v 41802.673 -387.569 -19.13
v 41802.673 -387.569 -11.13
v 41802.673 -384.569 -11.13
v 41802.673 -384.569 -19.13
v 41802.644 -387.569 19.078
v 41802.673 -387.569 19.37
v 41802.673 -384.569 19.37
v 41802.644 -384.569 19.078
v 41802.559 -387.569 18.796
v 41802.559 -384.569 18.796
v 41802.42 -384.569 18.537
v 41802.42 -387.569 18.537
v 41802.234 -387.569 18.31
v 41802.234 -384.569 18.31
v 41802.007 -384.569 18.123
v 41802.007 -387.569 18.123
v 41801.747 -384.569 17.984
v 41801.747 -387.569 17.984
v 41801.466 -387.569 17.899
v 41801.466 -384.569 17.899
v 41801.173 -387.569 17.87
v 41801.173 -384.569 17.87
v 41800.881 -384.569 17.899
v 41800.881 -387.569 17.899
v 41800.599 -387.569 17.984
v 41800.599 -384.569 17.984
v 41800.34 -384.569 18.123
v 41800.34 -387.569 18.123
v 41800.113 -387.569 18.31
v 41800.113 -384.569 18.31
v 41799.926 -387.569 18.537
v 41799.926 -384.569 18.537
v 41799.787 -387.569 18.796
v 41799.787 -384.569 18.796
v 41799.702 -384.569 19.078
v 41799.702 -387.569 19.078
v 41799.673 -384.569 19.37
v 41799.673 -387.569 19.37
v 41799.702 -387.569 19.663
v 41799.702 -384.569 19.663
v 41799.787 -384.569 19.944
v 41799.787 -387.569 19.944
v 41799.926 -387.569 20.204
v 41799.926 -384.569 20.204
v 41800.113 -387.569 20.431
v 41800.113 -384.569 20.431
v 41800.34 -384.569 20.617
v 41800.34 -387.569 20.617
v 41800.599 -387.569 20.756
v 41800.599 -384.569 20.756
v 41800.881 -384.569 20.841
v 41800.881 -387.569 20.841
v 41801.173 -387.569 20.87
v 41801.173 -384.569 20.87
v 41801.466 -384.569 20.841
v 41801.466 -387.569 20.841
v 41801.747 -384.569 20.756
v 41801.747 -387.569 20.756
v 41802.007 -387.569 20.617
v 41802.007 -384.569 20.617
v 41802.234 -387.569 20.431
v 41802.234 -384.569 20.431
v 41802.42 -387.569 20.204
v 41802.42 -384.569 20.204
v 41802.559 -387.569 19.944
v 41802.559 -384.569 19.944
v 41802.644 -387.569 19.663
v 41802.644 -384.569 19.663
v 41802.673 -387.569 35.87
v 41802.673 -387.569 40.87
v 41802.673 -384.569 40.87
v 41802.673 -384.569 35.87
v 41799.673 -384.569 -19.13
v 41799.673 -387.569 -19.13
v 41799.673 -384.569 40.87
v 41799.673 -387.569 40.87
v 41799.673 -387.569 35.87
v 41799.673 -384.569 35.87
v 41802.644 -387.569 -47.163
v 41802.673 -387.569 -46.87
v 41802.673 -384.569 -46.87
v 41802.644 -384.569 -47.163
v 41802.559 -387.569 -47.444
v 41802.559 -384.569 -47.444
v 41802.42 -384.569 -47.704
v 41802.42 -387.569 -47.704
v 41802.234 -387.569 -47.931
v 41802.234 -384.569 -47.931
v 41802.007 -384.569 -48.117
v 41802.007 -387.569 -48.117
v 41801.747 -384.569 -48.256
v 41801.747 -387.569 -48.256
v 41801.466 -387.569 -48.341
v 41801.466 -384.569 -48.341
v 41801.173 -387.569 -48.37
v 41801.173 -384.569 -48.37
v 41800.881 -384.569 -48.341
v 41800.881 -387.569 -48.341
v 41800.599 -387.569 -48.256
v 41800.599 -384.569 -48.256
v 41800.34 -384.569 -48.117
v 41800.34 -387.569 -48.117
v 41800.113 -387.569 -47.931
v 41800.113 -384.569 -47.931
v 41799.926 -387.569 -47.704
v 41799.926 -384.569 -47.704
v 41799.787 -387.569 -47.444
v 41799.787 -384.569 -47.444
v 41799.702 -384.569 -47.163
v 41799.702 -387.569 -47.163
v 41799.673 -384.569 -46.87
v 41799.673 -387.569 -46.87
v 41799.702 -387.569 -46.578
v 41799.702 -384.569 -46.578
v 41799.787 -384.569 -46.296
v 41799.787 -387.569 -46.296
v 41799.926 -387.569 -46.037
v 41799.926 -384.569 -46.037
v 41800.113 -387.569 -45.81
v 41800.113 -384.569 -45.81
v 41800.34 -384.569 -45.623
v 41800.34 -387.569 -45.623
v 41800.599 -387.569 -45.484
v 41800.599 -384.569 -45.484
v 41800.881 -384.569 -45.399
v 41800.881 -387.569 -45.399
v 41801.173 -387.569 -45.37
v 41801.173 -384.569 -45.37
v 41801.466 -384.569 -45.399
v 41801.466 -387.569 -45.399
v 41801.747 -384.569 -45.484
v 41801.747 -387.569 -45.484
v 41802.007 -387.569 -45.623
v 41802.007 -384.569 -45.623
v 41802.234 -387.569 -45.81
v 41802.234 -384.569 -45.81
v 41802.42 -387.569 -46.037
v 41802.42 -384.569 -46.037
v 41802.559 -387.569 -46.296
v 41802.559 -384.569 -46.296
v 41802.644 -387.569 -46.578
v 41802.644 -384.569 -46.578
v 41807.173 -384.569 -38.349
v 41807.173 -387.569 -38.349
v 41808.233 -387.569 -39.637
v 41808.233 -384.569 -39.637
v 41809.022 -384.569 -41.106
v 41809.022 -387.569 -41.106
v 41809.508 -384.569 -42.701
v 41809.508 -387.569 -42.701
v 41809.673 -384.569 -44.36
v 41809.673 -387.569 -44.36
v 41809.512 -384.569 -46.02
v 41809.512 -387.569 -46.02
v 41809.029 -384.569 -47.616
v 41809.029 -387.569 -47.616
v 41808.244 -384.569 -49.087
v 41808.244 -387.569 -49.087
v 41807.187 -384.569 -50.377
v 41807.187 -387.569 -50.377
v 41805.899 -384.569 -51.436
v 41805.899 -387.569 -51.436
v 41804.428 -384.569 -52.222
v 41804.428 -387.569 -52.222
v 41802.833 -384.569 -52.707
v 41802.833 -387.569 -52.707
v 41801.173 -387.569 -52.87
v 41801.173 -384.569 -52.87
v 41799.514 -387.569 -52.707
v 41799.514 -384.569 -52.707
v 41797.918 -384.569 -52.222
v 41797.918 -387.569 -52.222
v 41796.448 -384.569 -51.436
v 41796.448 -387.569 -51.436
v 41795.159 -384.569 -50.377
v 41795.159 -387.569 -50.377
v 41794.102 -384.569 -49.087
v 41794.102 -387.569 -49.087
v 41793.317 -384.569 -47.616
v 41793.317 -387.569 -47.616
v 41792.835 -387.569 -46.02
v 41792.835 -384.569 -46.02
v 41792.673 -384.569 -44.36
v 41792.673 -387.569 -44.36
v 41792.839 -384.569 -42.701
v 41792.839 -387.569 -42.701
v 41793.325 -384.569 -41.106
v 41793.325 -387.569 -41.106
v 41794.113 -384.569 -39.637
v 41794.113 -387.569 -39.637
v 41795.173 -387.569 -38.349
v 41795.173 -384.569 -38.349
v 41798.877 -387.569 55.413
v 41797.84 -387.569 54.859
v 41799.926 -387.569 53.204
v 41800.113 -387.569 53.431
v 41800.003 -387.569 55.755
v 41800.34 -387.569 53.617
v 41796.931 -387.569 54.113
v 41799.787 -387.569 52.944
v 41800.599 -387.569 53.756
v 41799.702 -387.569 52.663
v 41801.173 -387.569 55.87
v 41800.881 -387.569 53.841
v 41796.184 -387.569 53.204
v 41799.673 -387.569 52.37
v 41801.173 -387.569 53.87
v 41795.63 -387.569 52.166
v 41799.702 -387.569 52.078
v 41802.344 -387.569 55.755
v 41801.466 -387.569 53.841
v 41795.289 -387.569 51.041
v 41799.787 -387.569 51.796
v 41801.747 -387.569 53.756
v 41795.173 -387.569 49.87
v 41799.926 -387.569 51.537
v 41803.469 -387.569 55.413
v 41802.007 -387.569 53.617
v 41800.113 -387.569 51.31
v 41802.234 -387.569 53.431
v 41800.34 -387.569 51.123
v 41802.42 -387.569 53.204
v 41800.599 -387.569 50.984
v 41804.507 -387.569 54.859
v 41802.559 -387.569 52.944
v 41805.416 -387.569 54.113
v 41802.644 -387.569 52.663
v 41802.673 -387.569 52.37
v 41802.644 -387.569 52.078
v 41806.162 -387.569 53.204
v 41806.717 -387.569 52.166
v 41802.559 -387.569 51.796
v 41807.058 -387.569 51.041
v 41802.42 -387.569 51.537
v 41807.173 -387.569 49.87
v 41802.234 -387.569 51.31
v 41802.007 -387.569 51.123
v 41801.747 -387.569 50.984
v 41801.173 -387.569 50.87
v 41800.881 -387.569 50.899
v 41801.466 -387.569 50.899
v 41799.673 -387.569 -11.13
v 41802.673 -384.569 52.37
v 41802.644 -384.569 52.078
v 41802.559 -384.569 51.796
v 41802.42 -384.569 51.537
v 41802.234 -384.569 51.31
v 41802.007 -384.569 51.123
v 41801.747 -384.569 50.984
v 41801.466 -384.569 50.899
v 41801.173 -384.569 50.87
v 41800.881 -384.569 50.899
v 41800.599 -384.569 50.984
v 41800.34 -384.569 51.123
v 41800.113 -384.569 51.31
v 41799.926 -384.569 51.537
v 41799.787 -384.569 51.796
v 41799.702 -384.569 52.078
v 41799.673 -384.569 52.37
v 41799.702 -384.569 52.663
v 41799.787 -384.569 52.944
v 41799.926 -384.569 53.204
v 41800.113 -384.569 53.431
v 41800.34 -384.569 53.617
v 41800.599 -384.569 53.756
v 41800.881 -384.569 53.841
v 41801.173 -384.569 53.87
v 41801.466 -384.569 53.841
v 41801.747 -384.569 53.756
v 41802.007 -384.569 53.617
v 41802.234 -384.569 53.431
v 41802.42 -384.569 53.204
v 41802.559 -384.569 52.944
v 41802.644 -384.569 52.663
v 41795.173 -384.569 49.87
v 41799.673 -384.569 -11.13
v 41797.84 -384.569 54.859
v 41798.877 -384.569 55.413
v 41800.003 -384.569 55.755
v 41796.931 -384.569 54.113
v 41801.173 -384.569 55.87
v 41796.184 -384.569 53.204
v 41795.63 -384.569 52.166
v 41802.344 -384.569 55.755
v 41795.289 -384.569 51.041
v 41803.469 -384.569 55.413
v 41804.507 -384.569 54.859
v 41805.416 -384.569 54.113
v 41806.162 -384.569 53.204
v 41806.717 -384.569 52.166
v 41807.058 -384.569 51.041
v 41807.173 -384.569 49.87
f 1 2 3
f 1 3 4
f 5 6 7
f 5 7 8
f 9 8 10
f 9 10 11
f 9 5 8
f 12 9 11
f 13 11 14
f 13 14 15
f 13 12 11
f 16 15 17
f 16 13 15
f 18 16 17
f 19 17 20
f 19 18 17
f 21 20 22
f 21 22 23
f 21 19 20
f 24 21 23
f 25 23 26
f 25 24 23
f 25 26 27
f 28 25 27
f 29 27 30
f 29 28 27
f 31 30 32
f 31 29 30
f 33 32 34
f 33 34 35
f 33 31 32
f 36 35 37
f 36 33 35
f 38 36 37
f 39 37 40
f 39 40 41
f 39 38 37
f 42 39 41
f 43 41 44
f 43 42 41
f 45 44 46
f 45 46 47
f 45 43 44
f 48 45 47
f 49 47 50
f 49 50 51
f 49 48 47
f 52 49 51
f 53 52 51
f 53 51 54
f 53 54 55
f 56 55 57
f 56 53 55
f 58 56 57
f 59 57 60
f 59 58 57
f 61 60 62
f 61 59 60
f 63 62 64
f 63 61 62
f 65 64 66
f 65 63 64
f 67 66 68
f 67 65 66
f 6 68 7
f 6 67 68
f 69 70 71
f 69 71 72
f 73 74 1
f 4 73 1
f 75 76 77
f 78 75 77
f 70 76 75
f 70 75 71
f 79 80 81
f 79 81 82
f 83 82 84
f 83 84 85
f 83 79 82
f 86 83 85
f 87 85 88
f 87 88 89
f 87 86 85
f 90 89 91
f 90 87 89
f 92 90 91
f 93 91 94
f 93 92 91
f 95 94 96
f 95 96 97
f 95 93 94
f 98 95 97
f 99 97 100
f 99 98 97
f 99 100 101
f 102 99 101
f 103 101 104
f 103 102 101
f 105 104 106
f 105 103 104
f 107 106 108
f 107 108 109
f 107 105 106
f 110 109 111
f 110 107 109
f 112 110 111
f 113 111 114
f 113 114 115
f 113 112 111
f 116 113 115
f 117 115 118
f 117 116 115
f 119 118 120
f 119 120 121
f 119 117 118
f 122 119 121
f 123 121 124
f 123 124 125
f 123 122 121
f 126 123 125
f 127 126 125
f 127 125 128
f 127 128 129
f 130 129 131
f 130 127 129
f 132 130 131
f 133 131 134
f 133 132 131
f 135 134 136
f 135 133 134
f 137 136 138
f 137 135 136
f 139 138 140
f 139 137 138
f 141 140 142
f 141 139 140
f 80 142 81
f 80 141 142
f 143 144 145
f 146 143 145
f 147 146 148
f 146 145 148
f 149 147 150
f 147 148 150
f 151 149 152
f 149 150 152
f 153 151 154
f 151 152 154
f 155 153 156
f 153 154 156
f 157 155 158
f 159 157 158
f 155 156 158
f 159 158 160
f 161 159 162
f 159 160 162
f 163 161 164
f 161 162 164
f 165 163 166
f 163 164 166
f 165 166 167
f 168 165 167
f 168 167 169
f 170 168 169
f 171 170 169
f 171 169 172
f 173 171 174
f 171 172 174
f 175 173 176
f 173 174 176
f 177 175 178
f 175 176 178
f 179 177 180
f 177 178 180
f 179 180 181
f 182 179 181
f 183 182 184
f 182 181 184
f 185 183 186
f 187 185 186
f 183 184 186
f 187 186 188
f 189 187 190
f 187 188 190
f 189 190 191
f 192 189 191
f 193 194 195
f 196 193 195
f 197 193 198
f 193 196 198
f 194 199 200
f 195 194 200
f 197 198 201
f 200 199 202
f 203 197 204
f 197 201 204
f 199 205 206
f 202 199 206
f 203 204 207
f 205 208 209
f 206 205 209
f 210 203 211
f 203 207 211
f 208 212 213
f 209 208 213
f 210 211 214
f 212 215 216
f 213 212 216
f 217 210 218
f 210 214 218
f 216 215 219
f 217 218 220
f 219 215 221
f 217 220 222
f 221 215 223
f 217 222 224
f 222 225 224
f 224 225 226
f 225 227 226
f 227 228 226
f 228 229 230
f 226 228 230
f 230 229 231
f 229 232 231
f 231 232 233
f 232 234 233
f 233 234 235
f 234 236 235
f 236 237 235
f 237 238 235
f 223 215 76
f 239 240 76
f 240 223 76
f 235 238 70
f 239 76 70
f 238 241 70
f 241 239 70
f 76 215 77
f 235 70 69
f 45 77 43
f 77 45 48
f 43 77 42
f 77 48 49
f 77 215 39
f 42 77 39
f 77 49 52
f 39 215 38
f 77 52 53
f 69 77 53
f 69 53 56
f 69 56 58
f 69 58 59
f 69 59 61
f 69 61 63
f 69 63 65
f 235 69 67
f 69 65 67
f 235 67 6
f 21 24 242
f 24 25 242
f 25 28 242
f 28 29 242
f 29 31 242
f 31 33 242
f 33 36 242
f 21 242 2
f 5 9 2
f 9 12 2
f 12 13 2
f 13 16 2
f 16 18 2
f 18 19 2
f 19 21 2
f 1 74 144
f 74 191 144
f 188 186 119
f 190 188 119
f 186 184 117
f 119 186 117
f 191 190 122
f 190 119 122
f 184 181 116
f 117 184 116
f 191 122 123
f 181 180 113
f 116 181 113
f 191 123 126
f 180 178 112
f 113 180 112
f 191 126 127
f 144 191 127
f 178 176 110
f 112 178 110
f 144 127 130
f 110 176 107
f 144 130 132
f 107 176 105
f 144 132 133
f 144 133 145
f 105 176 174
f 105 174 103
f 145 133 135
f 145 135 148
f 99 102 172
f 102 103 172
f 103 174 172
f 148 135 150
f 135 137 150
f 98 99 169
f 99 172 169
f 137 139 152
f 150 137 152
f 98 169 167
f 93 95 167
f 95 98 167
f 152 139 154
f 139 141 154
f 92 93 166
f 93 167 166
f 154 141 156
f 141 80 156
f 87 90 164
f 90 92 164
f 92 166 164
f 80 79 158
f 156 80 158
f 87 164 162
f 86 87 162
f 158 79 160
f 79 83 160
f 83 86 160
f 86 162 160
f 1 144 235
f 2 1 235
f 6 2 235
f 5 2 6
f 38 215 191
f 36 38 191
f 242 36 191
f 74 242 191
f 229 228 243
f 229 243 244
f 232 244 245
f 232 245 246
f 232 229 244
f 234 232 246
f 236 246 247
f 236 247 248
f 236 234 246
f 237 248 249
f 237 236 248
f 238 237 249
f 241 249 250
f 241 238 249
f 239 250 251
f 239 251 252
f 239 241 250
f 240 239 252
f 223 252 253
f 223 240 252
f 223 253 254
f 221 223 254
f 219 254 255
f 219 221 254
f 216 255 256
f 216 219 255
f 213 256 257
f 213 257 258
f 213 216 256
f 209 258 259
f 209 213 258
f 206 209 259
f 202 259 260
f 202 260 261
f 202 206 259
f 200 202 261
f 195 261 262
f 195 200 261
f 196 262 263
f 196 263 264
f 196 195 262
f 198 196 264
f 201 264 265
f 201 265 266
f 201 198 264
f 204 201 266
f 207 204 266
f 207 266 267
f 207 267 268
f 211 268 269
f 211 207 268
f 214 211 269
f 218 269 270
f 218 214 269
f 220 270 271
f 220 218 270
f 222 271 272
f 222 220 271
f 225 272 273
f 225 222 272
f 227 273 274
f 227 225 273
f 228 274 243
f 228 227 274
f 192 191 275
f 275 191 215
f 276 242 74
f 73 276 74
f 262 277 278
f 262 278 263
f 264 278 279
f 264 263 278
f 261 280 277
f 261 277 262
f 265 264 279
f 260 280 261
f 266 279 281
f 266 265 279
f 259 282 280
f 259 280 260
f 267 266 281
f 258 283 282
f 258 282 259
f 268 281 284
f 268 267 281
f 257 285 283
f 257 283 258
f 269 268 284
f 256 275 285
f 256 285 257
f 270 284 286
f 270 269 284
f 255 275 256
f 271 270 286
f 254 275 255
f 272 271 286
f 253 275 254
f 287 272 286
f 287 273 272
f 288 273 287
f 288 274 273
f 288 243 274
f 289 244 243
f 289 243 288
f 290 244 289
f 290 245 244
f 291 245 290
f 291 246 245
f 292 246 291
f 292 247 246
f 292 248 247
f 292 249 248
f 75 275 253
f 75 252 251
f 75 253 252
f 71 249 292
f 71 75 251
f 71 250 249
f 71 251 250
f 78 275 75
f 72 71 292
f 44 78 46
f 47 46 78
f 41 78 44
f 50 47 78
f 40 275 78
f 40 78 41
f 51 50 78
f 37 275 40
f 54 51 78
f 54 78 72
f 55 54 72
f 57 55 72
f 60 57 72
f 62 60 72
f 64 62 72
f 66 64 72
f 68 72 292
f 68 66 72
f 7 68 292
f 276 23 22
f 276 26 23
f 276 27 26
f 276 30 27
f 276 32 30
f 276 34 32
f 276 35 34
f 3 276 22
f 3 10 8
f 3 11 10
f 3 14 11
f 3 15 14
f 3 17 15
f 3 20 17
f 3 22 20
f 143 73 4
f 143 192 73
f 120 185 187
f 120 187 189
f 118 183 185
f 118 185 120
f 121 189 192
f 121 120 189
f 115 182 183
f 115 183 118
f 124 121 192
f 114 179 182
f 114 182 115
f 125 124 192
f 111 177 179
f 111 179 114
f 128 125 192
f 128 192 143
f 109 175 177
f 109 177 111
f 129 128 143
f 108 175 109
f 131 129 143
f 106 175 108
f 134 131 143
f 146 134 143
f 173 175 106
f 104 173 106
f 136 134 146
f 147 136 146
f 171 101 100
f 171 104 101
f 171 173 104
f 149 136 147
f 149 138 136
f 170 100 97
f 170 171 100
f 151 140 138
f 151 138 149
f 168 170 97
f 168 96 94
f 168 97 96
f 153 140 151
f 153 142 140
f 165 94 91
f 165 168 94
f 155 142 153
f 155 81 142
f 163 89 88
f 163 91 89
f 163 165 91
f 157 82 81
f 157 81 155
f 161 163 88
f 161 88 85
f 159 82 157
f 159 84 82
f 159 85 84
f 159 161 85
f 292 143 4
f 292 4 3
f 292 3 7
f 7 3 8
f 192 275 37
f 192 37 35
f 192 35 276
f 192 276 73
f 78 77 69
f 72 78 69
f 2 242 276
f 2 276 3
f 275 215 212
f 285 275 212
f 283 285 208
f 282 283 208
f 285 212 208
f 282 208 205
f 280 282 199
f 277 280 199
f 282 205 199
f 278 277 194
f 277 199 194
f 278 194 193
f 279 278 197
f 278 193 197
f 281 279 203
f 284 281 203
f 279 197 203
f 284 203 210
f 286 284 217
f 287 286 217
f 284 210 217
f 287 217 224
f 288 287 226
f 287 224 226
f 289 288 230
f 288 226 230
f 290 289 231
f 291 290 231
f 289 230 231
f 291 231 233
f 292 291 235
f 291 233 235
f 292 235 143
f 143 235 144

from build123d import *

# Parameters (mm, degrees)
CROQUIS1_R                 = 1.5
CROQUIS1_W                 = 3
CROQUIS1_H                 = 7.999999999
CROQUIS1_H_2               = 5
SALIENTE_EXTRUIR1_DEPTH    = 3
S_LIDO_MOVER_COPIAR1_ANGLE = 90


with BuildPart() as part:
    # Croquis1 → Saliente-Extruir1 (new body)
    with BuildSketch(Plane.XY):
        with BuildLine():
            Line((41807.173257962, -434.43949549), (41807.173257962, -346.219921492))
            ThreePointArc((41807.173257962, -346.219921492), (41801.173257962, -331.699124202), (41795.173257962, -346.219921492))
            Line((41795.173257962, -346.219921492), (41795.173257962, -434.43949549))
            ThreePointArc((41795.173257962, -434.43949549), (41801.173257962, -440.43949549), (41807.173257962, -434.43949549))
        make_face()
        with Locations((41801.173257962, -337.699124202)):
            Circle(CROQUIS1_R, mode=Mode.SUBTRACT)
        with Locations((41801.173257962, -403.93949549)):
            Circle(CROQUIS1_R, mode=Mode.SUBTRACT)
        with Locations((41801.173257962, -436.93949549)):
            Circle(CROQUIS1_R, mode=Mode.SUBTRACT)
        with Locations((41801.173257962, -369.439495491)):
            Rectangle(CROQUIS1_W, CROQUIS1_H, mode=Mode.SUBTRACT)
        with Locations((41801.173257962, -422.93949549)):
            Rectangle(CROQUIS1_W, CROQUIS1_H_2, mode=Mode.SUBTRACT)
    extrude(amount=SALIENTE_EXTRUIR1_DEPTH)


with BuildPart() as part_1:
    # Sólido-Mover/Copiar1: moved
    add(part.part.rotate(Axis((0, -386.069309846, 1.5), (-1, 0, 0)), S_LIDO_MOVER_COPIAR1_ANGLE))


solid = part_1.part
